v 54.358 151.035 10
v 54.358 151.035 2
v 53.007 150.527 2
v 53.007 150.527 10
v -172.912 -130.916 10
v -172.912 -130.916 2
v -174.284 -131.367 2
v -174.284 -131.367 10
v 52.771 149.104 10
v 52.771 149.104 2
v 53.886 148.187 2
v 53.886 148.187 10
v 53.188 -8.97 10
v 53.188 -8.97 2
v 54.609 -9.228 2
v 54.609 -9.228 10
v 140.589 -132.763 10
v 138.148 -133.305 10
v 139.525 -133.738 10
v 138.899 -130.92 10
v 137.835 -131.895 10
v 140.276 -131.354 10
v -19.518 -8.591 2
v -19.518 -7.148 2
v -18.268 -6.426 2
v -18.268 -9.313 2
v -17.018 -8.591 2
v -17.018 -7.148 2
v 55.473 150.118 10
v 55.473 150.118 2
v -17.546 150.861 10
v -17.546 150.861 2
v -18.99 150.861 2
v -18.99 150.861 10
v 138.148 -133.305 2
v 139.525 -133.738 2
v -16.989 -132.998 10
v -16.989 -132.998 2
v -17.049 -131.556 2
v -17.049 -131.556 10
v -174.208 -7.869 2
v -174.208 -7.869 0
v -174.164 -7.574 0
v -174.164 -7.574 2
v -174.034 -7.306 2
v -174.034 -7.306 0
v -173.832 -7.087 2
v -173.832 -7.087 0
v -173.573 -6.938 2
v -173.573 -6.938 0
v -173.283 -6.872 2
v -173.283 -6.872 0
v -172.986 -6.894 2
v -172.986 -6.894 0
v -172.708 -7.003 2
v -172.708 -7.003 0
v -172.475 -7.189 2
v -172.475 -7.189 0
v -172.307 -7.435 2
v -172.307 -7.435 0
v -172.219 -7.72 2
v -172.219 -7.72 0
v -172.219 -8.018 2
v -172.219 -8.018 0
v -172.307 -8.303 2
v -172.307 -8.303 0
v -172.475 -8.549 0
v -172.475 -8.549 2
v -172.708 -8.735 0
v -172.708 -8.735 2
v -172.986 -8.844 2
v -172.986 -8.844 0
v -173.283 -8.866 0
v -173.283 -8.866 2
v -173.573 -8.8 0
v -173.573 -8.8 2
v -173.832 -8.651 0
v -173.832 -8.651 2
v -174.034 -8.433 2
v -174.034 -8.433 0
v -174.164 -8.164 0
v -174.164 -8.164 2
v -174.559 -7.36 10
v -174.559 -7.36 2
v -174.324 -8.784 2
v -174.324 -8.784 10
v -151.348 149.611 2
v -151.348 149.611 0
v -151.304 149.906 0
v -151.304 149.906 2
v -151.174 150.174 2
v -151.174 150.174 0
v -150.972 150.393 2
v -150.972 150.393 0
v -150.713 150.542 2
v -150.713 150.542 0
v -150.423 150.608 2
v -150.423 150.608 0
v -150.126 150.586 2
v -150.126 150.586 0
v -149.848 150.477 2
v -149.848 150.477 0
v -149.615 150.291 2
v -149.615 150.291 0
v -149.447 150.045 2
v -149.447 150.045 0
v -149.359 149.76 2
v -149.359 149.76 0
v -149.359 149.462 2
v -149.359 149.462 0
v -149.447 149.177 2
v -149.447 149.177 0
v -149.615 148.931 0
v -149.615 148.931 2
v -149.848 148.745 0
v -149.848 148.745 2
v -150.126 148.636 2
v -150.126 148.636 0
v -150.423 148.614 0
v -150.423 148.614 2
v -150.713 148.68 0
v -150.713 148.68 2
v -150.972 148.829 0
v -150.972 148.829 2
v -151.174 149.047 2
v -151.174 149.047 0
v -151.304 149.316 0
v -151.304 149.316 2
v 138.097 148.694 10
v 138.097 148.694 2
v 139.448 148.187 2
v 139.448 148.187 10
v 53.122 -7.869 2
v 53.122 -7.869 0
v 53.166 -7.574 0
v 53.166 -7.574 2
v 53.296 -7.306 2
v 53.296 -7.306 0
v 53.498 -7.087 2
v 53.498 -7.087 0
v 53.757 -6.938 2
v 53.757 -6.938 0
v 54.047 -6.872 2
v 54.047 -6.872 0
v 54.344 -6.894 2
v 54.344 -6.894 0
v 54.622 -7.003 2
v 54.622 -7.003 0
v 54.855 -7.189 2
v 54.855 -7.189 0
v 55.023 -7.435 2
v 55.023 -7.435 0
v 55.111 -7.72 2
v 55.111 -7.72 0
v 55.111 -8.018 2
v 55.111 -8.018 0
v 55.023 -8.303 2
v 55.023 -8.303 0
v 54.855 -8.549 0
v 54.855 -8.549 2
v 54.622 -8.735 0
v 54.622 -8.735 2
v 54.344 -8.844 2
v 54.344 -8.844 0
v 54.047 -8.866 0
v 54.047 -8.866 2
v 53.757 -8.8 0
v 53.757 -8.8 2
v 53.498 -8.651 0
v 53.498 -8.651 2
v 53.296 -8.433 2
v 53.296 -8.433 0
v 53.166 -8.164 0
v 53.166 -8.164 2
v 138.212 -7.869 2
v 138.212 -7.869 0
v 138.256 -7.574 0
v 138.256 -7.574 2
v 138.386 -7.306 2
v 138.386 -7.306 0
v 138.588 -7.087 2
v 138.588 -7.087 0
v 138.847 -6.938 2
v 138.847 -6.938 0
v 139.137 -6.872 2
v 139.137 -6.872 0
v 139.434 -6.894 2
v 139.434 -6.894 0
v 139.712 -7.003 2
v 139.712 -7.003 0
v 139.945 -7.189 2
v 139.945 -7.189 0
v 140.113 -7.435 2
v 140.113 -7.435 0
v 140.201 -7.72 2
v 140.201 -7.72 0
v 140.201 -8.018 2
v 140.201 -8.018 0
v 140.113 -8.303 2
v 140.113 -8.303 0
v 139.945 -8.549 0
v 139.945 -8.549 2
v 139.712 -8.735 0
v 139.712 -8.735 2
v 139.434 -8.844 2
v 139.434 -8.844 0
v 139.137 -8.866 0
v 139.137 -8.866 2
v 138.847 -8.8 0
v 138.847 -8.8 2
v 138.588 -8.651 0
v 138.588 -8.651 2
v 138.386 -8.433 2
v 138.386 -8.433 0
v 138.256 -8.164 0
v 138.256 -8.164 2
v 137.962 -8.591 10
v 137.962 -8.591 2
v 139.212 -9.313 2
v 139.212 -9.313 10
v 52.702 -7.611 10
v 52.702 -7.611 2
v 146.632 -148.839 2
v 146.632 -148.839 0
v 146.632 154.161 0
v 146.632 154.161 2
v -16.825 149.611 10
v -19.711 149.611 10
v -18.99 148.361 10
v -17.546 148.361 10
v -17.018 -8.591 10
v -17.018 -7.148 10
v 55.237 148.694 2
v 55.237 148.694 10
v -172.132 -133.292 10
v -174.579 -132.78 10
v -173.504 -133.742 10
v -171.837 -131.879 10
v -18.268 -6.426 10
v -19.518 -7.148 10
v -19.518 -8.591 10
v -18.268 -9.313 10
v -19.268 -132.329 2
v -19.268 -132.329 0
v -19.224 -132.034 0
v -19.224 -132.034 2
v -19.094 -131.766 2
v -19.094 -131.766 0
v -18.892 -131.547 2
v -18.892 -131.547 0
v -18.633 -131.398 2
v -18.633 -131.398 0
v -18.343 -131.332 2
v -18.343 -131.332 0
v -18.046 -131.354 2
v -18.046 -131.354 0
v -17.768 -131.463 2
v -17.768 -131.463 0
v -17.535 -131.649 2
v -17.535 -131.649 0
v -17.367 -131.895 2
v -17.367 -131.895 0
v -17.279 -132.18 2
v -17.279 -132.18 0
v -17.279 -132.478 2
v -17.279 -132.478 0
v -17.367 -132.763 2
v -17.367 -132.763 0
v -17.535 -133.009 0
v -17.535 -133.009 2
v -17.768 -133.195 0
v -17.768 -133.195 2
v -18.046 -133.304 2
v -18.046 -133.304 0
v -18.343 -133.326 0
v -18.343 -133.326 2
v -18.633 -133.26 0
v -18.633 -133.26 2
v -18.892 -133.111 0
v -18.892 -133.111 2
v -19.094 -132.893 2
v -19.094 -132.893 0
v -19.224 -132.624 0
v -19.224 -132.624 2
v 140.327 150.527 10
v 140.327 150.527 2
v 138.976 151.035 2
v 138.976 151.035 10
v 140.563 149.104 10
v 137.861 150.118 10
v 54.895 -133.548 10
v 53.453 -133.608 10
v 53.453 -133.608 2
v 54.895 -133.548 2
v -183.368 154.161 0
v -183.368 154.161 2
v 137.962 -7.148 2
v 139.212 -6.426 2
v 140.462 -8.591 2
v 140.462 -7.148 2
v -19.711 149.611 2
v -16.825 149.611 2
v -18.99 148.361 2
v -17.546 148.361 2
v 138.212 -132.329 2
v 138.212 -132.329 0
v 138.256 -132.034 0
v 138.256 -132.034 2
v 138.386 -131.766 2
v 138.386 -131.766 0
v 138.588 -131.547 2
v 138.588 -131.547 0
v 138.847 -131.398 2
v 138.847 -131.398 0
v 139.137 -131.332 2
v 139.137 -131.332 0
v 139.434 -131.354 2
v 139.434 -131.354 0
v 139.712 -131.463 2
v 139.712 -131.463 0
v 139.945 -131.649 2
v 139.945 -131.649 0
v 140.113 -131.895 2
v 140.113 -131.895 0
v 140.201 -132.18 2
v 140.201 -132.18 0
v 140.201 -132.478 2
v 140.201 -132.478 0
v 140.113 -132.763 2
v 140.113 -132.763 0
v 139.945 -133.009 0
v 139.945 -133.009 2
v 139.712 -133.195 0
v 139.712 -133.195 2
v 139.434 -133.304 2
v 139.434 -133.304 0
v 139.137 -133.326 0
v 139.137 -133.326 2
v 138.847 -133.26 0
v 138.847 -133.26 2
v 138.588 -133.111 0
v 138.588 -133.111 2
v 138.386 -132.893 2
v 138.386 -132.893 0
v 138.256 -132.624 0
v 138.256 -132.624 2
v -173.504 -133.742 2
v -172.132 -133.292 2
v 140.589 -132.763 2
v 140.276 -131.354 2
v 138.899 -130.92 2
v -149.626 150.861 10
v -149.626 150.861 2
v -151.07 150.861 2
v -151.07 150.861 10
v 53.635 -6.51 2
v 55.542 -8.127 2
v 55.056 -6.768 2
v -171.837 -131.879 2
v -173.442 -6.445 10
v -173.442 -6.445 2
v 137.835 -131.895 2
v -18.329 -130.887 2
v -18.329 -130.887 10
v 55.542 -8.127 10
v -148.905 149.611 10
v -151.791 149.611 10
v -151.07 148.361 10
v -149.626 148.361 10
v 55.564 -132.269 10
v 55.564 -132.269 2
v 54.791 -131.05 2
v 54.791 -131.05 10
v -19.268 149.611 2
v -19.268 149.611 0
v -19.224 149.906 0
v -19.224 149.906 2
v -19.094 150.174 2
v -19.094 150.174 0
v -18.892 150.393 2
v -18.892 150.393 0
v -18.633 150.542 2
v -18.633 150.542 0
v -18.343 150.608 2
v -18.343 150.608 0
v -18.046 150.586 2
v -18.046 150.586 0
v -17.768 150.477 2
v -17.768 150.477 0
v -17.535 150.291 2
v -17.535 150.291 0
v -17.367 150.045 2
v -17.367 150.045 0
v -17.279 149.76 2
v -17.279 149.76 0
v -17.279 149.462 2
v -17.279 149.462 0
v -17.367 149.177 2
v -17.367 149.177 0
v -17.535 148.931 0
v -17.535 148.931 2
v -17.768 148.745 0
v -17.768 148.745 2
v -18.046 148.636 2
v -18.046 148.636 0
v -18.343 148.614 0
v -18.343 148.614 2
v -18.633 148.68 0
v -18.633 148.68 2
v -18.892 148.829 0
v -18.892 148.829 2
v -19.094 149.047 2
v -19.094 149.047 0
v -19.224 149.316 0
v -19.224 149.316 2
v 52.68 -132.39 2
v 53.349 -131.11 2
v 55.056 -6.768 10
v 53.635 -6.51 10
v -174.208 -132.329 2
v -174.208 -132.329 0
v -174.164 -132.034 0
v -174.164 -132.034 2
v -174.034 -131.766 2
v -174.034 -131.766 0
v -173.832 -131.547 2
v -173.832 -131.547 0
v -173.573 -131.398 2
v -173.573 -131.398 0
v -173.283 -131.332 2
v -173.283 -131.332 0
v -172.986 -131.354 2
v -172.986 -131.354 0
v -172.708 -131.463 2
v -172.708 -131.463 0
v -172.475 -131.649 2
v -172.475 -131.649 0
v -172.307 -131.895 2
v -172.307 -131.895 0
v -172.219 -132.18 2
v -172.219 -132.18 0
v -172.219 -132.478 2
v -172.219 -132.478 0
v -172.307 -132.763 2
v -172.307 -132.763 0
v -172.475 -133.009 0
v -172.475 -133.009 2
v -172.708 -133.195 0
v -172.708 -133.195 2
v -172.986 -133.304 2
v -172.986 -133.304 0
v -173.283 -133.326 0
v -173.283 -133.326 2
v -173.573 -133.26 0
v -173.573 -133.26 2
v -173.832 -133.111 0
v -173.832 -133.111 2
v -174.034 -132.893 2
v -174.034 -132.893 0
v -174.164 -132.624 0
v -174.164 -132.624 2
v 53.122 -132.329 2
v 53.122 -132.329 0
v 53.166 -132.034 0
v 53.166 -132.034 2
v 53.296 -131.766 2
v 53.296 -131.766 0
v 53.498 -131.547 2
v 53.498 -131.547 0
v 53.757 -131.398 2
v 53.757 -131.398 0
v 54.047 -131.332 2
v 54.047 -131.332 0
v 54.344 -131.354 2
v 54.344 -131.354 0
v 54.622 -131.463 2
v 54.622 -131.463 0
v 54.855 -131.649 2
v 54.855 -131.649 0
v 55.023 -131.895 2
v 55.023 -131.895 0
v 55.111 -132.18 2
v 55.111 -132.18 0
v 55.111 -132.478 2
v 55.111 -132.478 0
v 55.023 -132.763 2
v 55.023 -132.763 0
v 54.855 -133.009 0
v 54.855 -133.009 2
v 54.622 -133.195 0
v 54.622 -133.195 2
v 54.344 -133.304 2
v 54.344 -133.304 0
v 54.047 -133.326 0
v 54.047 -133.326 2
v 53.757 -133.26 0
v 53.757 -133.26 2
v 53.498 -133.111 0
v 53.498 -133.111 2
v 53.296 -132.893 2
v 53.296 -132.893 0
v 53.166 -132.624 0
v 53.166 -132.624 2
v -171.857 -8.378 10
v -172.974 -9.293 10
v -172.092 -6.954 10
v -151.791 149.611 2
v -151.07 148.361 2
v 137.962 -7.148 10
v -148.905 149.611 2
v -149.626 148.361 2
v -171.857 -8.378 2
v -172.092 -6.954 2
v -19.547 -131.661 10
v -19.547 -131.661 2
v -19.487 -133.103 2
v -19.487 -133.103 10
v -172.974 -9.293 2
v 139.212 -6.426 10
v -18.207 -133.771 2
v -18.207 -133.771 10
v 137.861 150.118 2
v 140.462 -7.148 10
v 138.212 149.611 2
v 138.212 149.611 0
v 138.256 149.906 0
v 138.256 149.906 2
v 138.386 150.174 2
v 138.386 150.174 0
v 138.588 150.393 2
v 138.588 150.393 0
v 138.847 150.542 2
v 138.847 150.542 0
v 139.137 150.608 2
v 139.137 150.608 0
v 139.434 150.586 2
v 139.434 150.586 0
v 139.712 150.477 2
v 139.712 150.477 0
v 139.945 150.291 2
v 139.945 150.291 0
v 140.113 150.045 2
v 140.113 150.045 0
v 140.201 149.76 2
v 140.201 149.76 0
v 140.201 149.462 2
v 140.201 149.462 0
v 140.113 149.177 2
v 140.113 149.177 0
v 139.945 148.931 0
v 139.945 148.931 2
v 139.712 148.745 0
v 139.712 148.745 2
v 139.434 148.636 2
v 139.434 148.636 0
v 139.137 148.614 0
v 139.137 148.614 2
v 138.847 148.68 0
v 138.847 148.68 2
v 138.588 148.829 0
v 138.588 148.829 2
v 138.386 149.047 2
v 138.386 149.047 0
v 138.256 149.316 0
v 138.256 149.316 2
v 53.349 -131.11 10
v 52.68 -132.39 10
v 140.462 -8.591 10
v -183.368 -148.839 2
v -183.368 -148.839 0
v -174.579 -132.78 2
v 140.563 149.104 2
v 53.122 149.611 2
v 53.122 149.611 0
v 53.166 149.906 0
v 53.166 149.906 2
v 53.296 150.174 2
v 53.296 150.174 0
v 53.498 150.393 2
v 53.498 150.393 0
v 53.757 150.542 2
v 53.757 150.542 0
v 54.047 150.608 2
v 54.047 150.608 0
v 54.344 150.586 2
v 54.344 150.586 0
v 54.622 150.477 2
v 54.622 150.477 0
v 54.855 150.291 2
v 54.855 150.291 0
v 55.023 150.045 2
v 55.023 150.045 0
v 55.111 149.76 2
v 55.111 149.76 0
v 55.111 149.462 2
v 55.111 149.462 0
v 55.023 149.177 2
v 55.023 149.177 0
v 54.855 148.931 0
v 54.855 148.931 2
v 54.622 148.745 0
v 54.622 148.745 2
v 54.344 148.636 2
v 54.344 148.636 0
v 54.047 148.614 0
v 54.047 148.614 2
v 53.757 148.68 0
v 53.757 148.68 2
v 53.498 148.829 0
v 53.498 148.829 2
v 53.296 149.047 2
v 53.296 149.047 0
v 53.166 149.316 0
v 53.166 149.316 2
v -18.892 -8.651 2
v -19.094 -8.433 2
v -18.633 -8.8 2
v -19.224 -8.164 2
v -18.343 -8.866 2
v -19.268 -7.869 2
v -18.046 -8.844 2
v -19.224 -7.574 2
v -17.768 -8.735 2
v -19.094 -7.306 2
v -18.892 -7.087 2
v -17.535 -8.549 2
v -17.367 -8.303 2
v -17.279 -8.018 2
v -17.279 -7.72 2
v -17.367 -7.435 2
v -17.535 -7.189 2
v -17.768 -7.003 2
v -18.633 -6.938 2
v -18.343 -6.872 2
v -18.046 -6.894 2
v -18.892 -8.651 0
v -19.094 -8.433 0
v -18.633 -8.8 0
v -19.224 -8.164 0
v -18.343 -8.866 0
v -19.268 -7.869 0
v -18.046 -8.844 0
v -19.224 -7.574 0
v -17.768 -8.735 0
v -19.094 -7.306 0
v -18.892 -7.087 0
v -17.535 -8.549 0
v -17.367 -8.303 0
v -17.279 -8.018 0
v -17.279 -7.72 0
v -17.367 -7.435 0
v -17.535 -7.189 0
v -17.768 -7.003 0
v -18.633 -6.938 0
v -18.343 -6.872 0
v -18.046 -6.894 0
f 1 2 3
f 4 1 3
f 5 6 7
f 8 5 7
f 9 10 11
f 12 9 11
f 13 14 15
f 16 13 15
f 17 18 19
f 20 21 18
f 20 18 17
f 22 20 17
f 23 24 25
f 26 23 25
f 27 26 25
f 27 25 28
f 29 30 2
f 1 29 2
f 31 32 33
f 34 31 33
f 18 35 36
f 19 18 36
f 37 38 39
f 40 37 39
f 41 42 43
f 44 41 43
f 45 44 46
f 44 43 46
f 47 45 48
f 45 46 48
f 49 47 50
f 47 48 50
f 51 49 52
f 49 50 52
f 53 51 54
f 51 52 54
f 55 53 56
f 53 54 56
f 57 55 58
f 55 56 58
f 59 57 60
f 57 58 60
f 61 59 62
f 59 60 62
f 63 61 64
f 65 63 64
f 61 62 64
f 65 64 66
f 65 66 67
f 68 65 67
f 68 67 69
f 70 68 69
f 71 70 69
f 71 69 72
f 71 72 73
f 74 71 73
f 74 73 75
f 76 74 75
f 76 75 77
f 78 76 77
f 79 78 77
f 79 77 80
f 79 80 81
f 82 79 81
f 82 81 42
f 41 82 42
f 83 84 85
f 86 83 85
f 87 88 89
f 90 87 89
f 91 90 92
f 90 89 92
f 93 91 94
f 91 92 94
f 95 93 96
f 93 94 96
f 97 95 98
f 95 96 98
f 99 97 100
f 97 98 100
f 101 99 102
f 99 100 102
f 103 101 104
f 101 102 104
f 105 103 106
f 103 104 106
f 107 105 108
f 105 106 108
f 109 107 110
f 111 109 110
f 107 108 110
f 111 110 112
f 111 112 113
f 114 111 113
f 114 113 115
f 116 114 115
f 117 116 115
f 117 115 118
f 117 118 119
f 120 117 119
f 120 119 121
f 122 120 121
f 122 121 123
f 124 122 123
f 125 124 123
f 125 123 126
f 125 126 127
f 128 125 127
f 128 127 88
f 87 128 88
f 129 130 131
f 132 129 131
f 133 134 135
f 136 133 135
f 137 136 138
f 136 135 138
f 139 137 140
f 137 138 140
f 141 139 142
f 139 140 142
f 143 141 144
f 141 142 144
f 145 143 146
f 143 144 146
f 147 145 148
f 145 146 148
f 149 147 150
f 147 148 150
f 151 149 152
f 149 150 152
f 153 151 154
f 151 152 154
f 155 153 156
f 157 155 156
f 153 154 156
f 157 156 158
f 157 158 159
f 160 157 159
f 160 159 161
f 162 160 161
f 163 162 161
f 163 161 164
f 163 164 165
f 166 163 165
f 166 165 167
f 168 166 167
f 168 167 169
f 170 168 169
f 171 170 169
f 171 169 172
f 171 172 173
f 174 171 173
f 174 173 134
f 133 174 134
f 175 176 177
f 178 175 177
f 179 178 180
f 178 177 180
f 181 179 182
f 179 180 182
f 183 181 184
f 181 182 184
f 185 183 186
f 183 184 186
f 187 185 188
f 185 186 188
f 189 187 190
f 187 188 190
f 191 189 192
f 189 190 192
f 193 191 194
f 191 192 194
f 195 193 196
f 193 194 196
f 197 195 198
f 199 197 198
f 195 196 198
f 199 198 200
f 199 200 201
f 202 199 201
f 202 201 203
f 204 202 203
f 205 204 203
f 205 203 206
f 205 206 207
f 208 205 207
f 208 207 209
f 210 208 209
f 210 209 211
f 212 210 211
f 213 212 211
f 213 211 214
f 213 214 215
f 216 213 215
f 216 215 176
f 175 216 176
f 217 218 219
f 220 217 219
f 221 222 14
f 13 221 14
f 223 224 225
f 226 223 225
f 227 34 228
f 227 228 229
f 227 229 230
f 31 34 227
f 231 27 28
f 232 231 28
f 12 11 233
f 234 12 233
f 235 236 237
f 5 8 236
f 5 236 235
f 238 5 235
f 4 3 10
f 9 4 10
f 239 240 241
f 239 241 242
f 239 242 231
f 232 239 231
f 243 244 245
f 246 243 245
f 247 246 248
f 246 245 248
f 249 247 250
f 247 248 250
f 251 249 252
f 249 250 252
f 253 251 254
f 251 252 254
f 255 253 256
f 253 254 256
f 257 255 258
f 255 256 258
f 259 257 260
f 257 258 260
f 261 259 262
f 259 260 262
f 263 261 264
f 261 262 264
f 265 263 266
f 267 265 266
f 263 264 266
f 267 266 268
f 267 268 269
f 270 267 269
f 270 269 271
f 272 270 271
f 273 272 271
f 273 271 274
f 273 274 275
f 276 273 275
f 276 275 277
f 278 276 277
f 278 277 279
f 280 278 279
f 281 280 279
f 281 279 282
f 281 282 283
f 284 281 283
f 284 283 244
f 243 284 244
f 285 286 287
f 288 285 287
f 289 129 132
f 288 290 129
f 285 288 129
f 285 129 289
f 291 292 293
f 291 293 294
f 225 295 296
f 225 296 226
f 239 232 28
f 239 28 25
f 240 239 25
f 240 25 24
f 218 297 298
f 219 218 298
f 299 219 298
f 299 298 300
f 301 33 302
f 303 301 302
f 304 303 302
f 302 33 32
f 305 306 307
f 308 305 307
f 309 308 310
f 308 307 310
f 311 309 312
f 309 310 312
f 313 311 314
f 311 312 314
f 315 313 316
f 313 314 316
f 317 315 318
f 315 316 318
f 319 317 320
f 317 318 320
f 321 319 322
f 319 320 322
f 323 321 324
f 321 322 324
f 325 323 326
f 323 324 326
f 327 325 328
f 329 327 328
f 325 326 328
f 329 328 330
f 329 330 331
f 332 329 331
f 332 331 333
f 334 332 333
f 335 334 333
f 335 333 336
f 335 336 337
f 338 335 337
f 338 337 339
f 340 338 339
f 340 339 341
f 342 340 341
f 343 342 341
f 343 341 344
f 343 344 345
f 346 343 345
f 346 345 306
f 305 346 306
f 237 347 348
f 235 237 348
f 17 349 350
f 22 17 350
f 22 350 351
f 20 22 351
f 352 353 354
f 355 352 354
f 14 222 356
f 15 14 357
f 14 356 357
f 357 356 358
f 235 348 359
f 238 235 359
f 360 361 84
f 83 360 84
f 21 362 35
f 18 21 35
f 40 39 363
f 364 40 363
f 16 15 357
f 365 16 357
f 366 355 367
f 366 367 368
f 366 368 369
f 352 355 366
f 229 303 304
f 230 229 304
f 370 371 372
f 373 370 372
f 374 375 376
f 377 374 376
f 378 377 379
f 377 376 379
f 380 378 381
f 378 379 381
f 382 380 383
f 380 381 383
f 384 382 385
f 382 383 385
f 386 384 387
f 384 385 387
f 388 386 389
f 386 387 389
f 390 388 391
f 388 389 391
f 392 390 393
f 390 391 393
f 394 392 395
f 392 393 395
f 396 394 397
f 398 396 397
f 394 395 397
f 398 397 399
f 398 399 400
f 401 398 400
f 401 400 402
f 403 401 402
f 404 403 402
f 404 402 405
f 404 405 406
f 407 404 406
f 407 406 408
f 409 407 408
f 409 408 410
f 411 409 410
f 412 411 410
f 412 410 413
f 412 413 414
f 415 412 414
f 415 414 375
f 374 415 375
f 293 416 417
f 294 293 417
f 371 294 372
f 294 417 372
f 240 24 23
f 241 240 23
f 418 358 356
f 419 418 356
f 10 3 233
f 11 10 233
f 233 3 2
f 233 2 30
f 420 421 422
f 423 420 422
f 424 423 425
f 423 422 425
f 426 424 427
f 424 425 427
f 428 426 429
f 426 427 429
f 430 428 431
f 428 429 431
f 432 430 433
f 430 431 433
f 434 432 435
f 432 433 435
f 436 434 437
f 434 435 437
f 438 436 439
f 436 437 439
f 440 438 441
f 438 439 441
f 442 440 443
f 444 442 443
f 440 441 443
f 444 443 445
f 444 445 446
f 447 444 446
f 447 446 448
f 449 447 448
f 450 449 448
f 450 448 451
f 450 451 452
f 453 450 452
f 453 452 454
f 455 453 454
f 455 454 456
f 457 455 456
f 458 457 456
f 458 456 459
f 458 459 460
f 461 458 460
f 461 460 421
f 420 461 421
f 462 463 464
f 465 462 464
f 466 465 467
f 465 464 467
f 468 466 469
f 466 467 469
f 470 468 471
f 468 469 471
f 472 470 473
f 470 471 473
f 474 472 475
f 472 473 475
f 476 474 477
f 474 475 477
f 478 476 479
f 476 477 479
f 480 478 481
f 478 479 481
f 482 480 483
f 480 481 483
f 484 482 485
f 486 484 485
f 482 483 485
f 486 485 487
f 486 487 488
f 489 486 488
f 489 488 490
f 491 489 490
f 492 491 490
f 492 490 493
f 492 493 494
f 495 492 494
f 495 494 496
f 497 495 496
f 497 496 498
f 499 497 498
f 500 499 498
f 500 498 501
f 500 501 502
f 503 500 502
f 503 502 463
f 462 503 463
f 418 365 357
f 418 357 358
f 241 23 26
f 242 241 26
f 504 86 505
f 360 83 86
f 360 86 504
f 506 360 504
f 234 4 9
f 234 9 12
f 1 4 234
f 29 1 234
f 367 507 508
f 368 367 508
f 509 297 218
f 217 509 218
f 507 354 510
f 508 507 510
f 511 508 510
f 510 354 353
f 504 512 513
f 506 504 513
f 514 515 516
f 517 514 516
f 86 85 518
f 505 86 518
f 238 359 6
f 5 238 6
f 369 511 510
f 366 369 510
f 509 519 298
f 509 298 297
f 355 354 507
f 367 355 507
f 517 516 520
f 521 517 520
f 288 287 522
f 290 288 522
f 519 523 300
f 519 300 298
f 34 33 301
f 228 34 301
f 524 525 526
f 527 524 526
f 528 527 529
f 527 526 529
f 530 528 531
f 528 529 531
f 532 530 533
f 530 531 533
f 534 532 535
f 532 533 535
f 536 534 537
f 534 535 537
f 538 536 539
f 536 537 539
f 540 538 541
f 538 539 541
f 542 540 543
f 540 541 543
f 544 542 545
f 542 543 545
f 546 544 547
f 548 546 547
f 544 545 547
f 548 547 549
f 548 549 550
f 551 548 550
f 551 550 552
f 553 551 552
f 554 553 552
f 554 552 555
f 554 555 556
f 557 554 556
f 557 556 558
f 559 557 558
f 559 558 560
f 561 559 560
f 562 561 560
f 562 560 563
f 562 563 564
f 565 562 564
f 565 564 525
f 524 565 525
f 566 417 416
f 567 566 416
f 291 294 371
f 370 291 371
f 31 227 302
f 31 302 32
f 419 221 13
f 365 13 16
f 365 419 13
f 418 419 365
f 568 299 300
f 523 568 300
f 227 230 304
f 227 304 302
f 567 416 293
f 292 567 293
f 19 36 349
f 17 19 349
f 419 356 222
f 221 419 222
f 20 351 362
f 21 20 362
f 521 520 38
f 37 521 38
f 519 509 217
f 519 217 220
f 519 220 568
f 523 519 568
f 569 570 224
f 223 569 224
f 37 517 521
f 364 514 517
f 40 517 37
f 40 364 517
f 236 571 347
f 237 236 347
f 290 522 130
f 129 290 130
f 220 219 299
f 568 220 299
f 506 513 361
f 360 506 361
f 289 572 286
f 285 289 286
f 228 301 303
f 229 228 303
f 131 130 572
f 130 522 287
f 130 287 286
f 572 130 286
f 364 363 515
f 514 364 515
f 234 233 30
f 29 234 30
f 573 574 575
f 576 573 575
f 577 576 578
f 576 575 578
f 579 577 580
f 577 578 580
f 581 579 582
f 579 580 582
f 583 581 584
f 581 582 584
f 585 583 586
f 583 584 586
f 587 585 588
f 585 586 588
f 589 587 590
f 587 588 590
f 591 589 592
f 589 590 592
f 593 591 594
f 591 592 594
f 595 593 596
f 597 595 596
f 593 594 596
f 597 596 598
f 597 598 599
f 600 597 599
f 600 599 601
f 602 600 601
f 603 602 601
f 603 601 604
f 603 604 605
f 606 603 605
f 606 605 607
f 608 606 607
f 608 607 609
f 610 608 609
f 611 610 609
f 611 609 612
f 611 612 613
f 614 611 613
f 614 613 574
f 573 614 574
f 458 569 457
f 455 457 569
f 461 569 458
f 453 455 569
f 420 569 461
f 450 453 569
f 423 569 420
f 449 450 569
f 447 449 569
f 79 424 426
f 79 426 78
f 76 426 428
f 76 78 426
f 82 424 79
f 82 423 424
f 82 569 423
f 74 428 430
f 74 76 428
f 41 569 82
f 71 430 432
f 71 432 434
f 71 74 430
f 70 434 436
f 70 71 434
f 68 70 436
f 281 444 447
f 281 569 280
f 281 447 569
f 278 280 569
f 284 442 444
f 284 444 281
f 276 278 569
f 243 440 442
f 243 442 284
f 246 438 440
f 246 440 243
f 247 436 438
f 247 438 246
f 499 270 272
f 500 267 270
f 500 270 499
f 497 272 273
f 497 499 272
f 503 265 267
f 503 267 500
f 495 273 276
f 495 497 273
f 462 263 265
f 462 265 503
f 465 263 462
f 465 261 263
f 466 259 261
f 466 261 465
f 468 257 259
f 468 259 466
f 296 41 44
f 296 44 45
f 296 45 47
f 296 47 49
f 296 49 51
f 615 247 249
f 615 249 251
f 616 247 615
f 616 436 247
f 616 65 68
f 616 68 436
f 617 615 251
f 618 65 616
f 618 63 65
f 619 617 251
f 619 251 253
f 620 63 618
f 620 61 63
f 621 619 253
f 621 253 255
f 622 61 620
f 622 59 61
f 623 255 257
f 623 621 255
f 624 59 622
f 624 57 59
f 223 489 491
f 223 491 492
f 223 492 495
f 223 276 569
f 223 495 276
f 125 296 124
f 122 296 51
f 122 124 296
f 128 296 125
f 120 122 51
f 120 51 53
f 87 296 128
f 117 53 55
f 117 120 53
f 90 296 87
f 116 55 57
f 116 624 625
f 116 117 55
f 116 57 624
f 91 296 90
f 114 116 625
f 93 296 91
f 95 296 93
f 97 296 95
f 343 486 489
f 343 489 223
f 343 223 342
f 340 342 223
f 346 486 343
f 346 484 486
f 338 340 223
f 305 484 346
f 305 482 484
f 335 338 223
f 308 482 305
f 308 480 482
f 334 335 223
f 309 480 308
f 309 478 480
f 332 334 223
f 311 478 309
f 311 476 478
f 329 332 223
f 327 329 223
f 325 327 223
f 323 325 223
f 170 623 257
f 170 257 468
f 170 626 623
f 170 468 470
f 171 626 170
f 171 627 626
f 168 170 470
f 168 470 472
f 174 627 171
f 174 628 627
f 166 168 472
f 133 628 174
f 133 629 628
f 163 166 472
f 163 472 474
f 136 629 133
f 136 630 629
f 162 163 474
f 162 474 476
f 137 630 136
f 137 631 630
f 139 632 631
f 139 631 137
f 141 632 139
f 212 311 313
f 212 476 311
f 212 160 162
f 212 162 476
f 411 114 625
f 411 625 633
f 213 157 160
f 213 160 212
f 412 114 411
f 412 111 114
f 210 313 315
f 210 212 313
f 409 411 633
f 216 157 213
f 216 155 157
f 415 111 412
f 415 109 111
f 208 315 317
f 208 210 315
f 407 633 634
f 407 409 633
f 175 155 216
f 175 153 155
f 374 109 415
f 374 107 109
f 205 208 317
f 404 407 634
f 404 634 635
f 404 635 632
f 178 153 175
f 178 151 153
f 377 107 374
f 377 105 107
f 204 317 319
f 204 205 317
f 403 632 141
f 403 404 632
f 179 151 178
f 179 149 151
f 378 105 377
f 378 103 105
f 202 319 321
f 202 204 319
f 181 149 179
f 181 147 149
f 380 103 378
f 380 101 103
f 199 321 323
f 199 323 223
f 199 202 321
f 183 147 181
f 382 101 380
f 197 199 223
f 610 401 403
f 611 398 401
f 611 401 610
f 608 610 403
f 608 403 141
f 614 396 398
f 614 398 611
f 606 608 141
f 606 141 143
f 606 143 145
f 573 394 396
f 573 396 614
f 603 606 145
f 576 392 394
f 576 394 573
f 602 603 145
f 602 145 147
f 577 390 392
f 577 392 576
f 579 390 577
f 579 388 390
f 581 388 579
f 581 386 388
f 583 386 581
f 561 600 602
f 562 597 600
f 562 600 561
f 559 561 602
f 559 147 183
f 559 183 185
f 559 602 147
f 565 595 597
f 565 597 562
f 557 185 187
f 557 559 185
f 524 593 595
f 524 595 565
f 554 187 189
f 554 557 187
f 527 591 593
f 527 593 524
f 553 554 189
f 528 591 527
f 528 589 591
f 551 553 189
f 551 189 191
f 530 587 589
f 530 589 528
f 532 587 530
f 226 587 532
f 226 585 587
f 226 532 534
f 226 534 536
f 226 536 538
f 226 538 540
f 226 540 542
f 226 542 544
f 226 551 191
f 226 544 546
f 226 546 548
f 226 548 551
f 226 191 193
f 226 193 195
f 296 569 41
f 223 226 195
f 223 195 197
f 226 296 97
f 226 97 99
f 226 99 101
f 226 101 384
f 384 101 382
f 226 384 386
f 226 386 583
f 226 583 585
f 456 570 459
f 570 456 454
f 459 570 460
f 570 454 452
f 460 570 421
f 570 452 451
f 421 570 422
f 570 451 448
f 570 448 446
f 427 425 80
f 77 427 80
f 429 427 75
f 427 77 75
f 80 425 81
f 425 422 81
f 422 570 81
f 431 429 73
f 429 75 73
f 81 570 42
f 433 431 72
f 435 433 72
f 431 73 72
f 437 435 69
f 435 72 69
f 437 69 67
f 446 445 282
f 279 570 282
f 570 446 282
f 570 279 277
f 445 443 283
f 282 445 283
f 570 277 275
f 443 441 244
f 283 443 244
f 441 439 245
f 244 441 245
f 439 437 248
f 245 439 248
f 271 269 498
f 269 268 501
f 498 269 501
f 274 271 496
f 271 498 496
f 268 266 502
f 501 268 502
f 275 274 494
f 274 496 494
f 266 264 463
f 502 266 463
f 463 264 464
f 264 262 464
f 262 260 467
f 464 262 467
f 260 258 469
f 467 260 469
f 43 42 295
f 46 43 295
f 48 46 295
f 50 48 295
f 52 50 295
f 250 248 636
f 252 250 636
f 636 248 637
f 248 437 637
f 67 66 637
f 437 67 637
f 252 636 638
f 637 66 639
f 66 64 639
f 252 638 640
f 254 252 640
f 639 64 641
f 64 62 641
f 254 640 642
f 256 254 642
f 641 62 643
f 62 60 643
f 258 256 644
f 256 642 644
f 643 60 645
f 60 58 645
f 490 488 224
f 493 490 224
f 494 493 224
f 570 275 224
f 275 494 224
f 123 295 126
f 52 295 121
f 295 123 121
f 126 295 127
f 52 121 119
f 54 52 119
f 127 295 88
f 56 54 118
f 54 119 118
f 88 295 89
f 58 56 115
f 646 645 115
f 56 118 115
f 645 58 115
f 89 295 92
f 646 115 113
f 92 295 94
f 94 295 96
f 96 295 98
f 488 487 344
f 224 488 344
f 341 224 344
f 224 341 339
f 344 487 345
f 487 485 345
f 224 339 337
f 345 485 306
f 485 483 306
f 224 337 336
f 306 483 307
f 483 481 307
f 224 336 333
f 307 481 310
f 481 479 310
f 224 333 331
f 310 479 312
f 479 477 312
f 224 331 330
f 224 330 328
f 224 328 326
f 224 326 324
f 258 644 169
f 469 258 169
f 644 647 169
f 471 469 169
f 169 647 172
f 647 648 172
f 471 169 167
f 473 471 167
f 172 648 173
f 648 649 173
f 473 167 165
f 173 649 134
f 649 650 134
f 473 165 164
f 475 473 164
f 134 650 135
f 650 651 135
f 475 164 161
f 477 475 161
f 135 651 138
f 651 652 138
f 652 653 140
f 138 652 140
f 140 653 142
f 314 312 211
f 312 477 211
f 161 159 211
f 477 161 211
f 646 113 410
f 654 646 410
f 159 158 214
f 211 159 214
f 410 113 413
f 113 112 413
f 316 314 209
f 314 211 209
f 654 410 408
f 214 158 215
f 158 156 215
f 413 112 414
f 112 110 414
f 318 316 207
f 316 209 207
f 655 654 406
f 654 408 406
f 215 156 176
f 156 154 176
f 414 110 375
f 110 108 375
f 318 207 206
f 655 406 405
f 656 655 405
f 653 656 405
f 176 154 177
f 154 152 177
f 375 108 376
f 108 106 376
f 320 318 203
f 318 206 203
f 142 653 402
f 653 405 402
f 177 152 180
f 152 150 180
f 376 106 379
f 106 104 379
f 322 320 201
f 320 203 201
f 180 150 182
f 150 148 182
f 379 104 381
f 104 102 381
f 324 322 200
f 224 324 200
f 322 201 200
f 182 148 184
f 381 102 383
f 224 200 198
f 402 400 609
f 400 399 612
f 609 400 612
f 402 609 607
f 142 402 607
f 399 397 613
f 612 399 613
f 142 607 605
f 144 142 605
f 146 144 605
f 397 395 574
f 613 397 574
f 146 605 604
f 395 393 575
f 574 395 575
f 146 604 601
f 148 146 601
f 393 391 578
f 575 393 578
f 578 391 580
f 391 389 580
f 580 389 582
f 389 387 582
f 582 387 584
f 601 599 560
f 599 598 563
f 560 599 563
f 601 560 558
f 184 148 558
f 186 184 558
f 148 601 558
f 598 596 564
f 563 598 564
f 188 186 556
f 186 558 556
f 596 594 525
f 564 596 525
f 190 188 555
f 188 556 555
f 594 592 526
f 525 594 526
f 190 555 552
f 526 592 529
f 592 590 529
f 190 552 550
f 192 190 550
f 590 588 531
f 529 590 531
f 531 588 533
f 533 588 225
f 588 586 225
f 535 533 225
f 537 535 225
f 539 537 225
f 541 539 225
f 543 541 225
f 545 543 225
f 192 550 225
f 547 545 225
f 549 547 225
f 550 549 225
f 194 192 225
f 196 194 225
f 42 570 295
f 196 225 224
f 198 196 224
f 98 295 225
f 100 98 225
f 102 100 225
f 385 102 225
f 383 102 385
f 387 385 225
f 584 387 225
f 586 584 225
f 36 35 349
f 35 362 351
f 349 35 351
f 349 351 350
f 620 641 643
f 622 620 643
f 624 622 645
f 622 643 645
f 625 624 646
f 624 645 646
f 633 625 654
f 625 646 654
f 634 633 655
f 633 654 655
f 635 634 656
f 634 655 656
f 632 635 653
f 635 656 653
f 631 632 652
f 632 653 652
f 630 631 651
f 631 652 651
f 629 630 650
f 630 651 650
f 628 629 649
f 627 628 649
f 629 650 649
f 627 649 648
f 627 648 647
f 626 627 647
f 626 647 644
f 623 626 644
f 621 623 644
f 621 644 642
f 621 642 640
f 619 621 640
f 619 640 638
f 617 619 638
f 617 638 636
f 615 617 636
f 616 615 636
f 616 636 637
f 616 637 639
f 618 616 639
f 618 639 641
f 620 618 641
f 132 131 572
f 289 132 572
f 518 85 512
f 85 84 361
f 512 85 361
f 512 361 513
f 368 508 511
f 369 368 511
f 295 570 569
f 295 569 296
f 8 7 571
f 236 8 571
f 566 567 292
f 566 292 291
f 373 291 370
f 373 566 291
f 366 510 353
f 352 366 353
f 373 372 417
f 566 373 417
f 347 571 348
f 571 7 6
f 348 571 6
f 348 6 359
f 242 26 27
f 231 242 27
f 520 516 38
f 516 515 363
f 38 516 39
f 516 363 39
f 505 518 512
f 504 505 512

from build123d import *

# Parameters (mm, degrees)
F0_W     = 330
F0_H     = 303
F1_DEPTH = 2
F3_D     = 2
F5_DEPTH = 8


with BuildPart() as f1:
    # F0 (on Top) → F1 (new body)
    with BuildSketch(Plane.XY):
        with Locations((-18.368048, 2.660746)):
            Rectangle(F0_W, F0_H)
    extrude(amount=F1_DEPTH)

    # F3 (through all)
    with Locations(Plane.XY.offset(2)):
        with Locations((-150.348048, 149.610746), (-173.208048, -7.869254), (-18.268048, -132.329254), (-173.208048, -132.329254), (-18.268048, -7.869254), (-18.268048, 149.610746), (139.211952, -132.329254), (54.121952, 149.610746), (139.211952, -7.869254), (139.211952, 149.610746), (54.121952, -132.329254), (54.121952, -7.869254)):
            Hole(F3_D / 2)


with BuildPart() as f5:
    # F4 (on face) → F5 (new body)
    with BuildSketch(Plane.XY.offset(2)):
        Polygon((-172.912444, -130.916473), (-174.283751, -131.366863), (-174.579355, -132.779644), (-173.503653, -133.742036), (-172.132346, -133.291646), (-171.836741, -131.878864), align=None)
        Polygon((-172.09183, -6.954163), (-173.442431, -6.445036), (-174.558649, -7.360127), (-174.324266, -8.784345), (-172.973665, -9.293473), (-171.857447, -8.378382), align=None)
        Polygon((-149.62636, 150.860746), (-151.069736, 150.860746), (-151.791424, 149.610746), (-151.069736, 148.360746), (-149.62636, 148.360746), (-148.904673, 149.610746), align=None)
        Polygon((-17.54636, 150.860746), (-18.989736, 150.860746), (-19.711424, 149.610746), (-18.989736, 148.360746), (-17.54636, 148.360746), (-16.824673, 149.610746), align=None)
        Polygon((53.885579, 148.186856), (55.23689, 148.694096), (55.473263, 150.117986), (54.358325, 151.034635), (53.007014, 150.527395), (52.770641, 149.103506), align=None)
        Polygon((138.097014, 148.694096), (139.448325, 148.186856), (140.563263, 149.103506), (140.32689, 150.527395), (138.975579, 151.034635), (137.860641, 150.117986), align=None)
        Polygon((137.961952, -7.147566), (137.961952, -8.590942), (139.211952, -9.31263), (140.461952, -8.590942), (140.461952, -7.147566), (139.211952, -6.425879), align=None)
        Polygon((53.635385, -6.510363), (52.701834, -7.611188), (53.188401, -8.970079), (54.608519, -9.228146), (55.54207, -8.127321), (55.055503, -6.768429), align=None)
        Polygon((-17.018048, -8.590942), (-17.018048, -7.147566), (-18.268048, -6.425879), (-19.518048, -7.147566), (-19.518048, -8.590942), (-18.268048, -9.31263), align=None)
        Polygon((-17.049446, -131.555729), (-18.328639, -130.887151), (-19.547242, -131.660676), (-19.486651, -133.102779), (-18.207457, -133.771358), (-16.988855, -132.997833), align=None)
        Polygon((53.348696, -131.110481), (52.679835, -132.389526), (53.453091, -133.6083), (54.895207, -133.548028), (55.564069, -132.268982), (54.790813, -131.050208), align=None)
        Polygon((140.275995, -131.353987), (138.899368, -130.920132), (137.835324, -131.895399), (138.147909, -133.304521), (139.524536, -133.738376), (140.588579, -132.763109), align=None)
    extrude(amount=F5_DEPTH)


solid = Compound([f1.part, f5.part])
